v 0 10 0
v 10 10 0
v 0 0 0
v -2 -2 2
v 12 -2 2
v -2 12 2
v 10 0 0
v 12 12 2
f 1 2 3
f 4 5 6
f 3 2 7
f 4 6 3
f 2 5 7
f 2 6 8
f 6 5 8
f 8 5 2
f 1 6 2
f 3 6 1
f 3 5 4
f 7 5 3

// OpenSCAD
module chamfer(xy, distance, center = false) {
       trf = center ? [0, 0, 0] : [xy[0]/2, xy[1]/2, 0];
       translate(trf) hull() {
        linear_extrude(height = 0.00001) square(xy, center = true);
        translate([0, 0, distance]) linear_extrude(height = 0.00001) square([xy[0]+distance*2, xy[1]+distance*2], center = true);
        }
}

chamfer([10, 10], 2, center = false);
